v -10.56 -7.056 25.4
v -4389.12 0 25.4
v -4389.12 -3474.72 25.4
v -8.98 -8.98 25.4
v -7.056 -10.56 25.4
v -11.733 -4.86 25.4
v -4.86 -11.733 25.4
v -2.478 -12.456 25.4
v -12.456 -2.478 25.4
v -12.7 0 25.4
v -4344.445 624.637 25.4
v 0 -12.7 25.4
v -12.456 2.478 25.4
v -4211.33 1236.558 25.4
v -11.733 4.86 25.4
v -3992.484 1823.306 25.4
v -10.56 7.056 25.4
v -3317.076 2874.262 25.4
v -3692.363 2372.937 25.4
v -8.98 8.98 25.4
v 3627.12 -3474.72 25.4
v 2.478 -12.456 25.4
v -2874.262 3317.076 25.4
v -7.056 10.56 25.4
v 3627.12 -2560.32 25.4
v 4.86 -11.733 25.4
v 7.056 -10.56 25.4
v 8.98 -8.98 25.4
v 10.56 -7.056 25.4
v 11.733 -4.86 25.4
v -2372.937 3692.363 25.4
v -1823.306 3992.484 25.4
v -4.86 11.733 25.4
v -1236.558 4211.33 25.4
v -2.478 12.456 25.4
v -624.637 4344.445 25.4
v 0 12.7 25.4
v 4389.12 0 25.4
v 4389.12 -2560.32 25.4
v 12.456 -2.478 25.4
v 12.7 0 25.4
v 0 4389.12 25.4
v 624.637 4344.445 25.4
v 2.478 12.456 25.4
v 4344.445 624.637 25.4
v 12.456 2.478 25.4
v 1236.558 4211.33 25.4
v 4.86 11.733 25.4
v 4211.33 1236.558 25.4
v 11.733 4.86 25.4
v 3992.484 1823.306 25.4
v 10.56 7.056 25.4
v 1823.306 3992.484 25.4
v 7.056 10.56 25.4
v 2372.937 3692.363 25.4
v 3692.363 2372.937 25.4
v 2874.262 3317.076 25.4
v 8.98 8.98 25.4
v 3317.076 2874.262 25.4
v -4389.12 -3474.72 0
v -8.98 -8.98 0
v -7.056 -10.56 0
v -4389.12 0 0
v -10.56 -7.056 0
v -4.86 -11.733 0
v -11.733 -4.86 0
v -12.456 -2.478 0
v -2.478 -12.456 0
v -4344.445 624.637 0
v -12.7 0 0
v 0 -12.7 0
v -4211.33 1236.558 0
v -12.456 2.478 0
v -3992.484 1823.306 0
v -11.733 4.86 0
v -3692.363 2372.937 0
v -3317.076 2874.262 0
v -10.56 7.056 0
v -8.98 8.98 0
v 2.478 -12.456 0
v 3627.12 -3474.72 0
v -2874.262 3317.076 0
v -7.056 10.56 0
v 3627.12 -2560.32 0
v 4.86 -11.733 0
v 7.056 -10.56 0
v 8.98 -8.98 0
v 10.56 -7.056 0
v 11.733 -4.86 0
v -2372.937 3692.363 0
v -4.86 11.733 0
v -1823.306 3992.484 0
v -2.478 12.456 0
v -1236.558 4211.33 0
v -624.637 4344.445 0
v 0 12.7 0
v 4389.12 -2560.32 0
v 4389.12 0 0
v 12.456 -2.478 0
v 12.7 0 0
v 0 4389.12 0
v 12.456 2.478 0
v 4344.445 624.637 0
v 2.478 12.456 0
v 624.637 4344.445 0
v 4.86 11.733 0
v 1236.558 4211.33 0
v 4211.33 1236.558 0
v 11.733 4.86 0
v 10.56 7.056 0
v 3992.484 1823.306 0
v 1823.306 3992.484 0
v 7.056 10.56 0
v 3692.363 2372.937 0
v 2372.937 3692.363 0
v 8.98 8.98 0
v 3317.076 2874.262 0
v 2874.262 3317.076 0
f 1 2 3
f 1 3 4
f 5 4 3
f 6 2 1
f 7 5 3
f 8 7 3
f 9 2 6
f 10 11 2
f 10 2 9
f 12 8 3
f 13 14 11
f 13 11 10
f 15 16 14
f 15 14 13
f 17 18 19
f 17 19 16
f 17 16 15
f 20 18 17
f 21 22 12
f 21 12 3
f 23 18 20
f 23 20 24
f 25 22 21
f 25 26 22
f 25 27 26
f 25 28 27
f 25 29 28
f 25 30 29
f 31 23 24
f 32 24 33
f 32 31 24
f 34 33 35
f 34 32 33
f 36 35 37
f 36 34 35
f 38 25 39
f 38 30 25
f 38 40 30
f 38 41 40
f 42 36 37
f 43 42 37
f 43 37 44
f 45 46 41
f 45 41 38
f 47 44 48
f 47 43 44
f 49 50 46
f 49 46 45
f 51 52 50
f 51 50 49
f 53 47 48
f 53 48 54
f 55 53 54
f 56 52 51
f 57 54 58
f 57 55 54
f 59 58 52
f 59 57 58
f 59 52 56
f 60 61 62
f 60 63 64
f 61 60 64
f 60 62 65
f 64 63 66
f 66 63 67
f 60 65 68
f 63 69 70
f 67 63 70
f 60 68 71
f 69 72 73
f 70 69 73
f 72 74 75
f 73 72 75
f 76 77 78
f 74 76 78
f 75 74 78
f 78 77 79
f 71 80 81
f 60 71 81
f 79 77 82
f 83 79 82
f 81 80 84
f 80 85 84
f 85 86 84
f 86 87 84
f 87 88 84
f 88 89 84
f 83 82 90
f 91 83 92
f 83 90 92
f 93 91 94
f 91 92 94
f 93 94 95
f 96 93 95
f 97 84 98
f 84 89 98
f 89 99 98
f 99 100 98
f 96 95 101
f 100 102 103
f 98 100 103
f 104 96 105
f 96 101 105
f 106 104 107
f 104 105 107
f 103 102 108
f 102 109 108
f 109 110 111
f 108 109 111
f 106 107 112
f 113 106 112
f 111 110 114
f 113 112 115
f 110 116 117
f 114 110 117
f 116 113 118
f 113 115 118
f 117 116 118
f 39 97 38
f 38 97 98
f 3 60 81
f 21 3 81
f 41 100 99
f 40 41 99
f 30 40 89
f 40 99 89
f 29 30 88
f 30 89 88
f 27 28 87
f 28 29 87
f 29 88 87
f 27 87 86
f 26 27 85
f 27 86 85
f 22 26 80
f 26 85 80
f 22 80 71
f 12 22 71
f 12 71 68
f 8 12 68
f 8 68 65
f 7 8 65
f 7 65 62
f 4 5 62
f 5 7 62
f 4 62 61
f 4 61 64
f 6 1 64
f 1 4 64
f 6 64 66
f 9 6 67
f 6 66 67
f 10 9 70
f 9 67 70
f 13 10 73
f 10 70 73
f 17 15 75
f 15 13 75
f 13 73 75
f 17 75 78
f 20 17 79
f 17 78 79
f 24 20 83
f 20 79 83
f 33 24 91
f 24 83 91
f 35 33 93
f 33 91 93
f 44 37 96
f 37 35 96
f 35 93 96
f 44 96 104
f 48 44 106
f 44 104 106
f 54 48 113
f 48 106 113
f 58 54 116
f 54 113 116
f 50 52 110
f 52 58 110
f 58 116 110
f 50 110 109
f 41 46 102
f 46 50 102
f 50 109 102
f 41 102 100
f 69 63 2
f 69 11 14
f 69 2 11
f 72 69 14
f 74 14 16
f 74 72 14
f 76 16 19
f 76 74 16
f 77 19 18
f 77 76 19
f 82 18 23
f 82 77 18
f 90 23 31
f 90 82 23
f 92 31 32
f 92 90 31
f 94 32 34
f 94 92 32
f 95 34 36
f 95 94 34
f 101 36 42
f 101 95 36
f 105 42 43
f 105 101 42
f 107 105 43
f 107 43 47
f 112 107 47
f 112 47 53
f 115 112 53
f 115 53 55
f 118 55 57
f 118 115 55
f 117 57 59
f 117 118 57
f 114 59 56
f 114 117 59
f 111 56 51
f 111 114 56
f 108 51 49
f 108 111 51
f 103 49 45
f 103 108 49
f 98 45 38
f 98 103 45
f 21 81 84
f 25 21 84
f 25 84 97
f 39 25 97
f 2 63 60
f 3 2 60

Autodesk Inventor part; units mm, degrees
ref_plane "YZ Plane" through (0, 0, 0) normal (1, 0, 0) x (0, 1, 0)
ref_plane "XZ Plane" through (0, 0, 0) normal (0, 1, 0) x (-1, 0, 0)
ref_plane "XY Plane" through (0, 0, 0) normal (0, 0, 1) x (1, 0, 0)
sketch "Sketch1" plane through (0, 0, 0) normal (0, 0, 1) x (1, 0, 0)
  arc A0 (4389.12, 0) -> (-4389.12, 0) centre (0, 0) ccw
  line L0 (-4389.12, 0) -> (-4389.12, -3474.72)
  line L1 (-4389.12, -3474.72) -> (3627.12, -3474.72)
  line L2 (3627.12, -3474.72) -> (3627.12, -2560.32)
  line L3 (3627.12, -2560.32) -> (4389.12, -2560.32)
  line L4 (4389.12, -2560.32) -> (4389.12, 0)
  circle A1 centre (0, 0) radius 12.7
  dimension "d0" = 4389.12
  dimension "d1" = 3474.72
  dimension "d2" = 914.4
  dimension "d3" = 762
  dimension "d4" = 2560.32
  dimension "d5" = 8016.24
  dimension "d6" = 25.4
extrude "Extrusion1" add sketch "Sketch1" along normal blind 25.4
properties part number "section"
